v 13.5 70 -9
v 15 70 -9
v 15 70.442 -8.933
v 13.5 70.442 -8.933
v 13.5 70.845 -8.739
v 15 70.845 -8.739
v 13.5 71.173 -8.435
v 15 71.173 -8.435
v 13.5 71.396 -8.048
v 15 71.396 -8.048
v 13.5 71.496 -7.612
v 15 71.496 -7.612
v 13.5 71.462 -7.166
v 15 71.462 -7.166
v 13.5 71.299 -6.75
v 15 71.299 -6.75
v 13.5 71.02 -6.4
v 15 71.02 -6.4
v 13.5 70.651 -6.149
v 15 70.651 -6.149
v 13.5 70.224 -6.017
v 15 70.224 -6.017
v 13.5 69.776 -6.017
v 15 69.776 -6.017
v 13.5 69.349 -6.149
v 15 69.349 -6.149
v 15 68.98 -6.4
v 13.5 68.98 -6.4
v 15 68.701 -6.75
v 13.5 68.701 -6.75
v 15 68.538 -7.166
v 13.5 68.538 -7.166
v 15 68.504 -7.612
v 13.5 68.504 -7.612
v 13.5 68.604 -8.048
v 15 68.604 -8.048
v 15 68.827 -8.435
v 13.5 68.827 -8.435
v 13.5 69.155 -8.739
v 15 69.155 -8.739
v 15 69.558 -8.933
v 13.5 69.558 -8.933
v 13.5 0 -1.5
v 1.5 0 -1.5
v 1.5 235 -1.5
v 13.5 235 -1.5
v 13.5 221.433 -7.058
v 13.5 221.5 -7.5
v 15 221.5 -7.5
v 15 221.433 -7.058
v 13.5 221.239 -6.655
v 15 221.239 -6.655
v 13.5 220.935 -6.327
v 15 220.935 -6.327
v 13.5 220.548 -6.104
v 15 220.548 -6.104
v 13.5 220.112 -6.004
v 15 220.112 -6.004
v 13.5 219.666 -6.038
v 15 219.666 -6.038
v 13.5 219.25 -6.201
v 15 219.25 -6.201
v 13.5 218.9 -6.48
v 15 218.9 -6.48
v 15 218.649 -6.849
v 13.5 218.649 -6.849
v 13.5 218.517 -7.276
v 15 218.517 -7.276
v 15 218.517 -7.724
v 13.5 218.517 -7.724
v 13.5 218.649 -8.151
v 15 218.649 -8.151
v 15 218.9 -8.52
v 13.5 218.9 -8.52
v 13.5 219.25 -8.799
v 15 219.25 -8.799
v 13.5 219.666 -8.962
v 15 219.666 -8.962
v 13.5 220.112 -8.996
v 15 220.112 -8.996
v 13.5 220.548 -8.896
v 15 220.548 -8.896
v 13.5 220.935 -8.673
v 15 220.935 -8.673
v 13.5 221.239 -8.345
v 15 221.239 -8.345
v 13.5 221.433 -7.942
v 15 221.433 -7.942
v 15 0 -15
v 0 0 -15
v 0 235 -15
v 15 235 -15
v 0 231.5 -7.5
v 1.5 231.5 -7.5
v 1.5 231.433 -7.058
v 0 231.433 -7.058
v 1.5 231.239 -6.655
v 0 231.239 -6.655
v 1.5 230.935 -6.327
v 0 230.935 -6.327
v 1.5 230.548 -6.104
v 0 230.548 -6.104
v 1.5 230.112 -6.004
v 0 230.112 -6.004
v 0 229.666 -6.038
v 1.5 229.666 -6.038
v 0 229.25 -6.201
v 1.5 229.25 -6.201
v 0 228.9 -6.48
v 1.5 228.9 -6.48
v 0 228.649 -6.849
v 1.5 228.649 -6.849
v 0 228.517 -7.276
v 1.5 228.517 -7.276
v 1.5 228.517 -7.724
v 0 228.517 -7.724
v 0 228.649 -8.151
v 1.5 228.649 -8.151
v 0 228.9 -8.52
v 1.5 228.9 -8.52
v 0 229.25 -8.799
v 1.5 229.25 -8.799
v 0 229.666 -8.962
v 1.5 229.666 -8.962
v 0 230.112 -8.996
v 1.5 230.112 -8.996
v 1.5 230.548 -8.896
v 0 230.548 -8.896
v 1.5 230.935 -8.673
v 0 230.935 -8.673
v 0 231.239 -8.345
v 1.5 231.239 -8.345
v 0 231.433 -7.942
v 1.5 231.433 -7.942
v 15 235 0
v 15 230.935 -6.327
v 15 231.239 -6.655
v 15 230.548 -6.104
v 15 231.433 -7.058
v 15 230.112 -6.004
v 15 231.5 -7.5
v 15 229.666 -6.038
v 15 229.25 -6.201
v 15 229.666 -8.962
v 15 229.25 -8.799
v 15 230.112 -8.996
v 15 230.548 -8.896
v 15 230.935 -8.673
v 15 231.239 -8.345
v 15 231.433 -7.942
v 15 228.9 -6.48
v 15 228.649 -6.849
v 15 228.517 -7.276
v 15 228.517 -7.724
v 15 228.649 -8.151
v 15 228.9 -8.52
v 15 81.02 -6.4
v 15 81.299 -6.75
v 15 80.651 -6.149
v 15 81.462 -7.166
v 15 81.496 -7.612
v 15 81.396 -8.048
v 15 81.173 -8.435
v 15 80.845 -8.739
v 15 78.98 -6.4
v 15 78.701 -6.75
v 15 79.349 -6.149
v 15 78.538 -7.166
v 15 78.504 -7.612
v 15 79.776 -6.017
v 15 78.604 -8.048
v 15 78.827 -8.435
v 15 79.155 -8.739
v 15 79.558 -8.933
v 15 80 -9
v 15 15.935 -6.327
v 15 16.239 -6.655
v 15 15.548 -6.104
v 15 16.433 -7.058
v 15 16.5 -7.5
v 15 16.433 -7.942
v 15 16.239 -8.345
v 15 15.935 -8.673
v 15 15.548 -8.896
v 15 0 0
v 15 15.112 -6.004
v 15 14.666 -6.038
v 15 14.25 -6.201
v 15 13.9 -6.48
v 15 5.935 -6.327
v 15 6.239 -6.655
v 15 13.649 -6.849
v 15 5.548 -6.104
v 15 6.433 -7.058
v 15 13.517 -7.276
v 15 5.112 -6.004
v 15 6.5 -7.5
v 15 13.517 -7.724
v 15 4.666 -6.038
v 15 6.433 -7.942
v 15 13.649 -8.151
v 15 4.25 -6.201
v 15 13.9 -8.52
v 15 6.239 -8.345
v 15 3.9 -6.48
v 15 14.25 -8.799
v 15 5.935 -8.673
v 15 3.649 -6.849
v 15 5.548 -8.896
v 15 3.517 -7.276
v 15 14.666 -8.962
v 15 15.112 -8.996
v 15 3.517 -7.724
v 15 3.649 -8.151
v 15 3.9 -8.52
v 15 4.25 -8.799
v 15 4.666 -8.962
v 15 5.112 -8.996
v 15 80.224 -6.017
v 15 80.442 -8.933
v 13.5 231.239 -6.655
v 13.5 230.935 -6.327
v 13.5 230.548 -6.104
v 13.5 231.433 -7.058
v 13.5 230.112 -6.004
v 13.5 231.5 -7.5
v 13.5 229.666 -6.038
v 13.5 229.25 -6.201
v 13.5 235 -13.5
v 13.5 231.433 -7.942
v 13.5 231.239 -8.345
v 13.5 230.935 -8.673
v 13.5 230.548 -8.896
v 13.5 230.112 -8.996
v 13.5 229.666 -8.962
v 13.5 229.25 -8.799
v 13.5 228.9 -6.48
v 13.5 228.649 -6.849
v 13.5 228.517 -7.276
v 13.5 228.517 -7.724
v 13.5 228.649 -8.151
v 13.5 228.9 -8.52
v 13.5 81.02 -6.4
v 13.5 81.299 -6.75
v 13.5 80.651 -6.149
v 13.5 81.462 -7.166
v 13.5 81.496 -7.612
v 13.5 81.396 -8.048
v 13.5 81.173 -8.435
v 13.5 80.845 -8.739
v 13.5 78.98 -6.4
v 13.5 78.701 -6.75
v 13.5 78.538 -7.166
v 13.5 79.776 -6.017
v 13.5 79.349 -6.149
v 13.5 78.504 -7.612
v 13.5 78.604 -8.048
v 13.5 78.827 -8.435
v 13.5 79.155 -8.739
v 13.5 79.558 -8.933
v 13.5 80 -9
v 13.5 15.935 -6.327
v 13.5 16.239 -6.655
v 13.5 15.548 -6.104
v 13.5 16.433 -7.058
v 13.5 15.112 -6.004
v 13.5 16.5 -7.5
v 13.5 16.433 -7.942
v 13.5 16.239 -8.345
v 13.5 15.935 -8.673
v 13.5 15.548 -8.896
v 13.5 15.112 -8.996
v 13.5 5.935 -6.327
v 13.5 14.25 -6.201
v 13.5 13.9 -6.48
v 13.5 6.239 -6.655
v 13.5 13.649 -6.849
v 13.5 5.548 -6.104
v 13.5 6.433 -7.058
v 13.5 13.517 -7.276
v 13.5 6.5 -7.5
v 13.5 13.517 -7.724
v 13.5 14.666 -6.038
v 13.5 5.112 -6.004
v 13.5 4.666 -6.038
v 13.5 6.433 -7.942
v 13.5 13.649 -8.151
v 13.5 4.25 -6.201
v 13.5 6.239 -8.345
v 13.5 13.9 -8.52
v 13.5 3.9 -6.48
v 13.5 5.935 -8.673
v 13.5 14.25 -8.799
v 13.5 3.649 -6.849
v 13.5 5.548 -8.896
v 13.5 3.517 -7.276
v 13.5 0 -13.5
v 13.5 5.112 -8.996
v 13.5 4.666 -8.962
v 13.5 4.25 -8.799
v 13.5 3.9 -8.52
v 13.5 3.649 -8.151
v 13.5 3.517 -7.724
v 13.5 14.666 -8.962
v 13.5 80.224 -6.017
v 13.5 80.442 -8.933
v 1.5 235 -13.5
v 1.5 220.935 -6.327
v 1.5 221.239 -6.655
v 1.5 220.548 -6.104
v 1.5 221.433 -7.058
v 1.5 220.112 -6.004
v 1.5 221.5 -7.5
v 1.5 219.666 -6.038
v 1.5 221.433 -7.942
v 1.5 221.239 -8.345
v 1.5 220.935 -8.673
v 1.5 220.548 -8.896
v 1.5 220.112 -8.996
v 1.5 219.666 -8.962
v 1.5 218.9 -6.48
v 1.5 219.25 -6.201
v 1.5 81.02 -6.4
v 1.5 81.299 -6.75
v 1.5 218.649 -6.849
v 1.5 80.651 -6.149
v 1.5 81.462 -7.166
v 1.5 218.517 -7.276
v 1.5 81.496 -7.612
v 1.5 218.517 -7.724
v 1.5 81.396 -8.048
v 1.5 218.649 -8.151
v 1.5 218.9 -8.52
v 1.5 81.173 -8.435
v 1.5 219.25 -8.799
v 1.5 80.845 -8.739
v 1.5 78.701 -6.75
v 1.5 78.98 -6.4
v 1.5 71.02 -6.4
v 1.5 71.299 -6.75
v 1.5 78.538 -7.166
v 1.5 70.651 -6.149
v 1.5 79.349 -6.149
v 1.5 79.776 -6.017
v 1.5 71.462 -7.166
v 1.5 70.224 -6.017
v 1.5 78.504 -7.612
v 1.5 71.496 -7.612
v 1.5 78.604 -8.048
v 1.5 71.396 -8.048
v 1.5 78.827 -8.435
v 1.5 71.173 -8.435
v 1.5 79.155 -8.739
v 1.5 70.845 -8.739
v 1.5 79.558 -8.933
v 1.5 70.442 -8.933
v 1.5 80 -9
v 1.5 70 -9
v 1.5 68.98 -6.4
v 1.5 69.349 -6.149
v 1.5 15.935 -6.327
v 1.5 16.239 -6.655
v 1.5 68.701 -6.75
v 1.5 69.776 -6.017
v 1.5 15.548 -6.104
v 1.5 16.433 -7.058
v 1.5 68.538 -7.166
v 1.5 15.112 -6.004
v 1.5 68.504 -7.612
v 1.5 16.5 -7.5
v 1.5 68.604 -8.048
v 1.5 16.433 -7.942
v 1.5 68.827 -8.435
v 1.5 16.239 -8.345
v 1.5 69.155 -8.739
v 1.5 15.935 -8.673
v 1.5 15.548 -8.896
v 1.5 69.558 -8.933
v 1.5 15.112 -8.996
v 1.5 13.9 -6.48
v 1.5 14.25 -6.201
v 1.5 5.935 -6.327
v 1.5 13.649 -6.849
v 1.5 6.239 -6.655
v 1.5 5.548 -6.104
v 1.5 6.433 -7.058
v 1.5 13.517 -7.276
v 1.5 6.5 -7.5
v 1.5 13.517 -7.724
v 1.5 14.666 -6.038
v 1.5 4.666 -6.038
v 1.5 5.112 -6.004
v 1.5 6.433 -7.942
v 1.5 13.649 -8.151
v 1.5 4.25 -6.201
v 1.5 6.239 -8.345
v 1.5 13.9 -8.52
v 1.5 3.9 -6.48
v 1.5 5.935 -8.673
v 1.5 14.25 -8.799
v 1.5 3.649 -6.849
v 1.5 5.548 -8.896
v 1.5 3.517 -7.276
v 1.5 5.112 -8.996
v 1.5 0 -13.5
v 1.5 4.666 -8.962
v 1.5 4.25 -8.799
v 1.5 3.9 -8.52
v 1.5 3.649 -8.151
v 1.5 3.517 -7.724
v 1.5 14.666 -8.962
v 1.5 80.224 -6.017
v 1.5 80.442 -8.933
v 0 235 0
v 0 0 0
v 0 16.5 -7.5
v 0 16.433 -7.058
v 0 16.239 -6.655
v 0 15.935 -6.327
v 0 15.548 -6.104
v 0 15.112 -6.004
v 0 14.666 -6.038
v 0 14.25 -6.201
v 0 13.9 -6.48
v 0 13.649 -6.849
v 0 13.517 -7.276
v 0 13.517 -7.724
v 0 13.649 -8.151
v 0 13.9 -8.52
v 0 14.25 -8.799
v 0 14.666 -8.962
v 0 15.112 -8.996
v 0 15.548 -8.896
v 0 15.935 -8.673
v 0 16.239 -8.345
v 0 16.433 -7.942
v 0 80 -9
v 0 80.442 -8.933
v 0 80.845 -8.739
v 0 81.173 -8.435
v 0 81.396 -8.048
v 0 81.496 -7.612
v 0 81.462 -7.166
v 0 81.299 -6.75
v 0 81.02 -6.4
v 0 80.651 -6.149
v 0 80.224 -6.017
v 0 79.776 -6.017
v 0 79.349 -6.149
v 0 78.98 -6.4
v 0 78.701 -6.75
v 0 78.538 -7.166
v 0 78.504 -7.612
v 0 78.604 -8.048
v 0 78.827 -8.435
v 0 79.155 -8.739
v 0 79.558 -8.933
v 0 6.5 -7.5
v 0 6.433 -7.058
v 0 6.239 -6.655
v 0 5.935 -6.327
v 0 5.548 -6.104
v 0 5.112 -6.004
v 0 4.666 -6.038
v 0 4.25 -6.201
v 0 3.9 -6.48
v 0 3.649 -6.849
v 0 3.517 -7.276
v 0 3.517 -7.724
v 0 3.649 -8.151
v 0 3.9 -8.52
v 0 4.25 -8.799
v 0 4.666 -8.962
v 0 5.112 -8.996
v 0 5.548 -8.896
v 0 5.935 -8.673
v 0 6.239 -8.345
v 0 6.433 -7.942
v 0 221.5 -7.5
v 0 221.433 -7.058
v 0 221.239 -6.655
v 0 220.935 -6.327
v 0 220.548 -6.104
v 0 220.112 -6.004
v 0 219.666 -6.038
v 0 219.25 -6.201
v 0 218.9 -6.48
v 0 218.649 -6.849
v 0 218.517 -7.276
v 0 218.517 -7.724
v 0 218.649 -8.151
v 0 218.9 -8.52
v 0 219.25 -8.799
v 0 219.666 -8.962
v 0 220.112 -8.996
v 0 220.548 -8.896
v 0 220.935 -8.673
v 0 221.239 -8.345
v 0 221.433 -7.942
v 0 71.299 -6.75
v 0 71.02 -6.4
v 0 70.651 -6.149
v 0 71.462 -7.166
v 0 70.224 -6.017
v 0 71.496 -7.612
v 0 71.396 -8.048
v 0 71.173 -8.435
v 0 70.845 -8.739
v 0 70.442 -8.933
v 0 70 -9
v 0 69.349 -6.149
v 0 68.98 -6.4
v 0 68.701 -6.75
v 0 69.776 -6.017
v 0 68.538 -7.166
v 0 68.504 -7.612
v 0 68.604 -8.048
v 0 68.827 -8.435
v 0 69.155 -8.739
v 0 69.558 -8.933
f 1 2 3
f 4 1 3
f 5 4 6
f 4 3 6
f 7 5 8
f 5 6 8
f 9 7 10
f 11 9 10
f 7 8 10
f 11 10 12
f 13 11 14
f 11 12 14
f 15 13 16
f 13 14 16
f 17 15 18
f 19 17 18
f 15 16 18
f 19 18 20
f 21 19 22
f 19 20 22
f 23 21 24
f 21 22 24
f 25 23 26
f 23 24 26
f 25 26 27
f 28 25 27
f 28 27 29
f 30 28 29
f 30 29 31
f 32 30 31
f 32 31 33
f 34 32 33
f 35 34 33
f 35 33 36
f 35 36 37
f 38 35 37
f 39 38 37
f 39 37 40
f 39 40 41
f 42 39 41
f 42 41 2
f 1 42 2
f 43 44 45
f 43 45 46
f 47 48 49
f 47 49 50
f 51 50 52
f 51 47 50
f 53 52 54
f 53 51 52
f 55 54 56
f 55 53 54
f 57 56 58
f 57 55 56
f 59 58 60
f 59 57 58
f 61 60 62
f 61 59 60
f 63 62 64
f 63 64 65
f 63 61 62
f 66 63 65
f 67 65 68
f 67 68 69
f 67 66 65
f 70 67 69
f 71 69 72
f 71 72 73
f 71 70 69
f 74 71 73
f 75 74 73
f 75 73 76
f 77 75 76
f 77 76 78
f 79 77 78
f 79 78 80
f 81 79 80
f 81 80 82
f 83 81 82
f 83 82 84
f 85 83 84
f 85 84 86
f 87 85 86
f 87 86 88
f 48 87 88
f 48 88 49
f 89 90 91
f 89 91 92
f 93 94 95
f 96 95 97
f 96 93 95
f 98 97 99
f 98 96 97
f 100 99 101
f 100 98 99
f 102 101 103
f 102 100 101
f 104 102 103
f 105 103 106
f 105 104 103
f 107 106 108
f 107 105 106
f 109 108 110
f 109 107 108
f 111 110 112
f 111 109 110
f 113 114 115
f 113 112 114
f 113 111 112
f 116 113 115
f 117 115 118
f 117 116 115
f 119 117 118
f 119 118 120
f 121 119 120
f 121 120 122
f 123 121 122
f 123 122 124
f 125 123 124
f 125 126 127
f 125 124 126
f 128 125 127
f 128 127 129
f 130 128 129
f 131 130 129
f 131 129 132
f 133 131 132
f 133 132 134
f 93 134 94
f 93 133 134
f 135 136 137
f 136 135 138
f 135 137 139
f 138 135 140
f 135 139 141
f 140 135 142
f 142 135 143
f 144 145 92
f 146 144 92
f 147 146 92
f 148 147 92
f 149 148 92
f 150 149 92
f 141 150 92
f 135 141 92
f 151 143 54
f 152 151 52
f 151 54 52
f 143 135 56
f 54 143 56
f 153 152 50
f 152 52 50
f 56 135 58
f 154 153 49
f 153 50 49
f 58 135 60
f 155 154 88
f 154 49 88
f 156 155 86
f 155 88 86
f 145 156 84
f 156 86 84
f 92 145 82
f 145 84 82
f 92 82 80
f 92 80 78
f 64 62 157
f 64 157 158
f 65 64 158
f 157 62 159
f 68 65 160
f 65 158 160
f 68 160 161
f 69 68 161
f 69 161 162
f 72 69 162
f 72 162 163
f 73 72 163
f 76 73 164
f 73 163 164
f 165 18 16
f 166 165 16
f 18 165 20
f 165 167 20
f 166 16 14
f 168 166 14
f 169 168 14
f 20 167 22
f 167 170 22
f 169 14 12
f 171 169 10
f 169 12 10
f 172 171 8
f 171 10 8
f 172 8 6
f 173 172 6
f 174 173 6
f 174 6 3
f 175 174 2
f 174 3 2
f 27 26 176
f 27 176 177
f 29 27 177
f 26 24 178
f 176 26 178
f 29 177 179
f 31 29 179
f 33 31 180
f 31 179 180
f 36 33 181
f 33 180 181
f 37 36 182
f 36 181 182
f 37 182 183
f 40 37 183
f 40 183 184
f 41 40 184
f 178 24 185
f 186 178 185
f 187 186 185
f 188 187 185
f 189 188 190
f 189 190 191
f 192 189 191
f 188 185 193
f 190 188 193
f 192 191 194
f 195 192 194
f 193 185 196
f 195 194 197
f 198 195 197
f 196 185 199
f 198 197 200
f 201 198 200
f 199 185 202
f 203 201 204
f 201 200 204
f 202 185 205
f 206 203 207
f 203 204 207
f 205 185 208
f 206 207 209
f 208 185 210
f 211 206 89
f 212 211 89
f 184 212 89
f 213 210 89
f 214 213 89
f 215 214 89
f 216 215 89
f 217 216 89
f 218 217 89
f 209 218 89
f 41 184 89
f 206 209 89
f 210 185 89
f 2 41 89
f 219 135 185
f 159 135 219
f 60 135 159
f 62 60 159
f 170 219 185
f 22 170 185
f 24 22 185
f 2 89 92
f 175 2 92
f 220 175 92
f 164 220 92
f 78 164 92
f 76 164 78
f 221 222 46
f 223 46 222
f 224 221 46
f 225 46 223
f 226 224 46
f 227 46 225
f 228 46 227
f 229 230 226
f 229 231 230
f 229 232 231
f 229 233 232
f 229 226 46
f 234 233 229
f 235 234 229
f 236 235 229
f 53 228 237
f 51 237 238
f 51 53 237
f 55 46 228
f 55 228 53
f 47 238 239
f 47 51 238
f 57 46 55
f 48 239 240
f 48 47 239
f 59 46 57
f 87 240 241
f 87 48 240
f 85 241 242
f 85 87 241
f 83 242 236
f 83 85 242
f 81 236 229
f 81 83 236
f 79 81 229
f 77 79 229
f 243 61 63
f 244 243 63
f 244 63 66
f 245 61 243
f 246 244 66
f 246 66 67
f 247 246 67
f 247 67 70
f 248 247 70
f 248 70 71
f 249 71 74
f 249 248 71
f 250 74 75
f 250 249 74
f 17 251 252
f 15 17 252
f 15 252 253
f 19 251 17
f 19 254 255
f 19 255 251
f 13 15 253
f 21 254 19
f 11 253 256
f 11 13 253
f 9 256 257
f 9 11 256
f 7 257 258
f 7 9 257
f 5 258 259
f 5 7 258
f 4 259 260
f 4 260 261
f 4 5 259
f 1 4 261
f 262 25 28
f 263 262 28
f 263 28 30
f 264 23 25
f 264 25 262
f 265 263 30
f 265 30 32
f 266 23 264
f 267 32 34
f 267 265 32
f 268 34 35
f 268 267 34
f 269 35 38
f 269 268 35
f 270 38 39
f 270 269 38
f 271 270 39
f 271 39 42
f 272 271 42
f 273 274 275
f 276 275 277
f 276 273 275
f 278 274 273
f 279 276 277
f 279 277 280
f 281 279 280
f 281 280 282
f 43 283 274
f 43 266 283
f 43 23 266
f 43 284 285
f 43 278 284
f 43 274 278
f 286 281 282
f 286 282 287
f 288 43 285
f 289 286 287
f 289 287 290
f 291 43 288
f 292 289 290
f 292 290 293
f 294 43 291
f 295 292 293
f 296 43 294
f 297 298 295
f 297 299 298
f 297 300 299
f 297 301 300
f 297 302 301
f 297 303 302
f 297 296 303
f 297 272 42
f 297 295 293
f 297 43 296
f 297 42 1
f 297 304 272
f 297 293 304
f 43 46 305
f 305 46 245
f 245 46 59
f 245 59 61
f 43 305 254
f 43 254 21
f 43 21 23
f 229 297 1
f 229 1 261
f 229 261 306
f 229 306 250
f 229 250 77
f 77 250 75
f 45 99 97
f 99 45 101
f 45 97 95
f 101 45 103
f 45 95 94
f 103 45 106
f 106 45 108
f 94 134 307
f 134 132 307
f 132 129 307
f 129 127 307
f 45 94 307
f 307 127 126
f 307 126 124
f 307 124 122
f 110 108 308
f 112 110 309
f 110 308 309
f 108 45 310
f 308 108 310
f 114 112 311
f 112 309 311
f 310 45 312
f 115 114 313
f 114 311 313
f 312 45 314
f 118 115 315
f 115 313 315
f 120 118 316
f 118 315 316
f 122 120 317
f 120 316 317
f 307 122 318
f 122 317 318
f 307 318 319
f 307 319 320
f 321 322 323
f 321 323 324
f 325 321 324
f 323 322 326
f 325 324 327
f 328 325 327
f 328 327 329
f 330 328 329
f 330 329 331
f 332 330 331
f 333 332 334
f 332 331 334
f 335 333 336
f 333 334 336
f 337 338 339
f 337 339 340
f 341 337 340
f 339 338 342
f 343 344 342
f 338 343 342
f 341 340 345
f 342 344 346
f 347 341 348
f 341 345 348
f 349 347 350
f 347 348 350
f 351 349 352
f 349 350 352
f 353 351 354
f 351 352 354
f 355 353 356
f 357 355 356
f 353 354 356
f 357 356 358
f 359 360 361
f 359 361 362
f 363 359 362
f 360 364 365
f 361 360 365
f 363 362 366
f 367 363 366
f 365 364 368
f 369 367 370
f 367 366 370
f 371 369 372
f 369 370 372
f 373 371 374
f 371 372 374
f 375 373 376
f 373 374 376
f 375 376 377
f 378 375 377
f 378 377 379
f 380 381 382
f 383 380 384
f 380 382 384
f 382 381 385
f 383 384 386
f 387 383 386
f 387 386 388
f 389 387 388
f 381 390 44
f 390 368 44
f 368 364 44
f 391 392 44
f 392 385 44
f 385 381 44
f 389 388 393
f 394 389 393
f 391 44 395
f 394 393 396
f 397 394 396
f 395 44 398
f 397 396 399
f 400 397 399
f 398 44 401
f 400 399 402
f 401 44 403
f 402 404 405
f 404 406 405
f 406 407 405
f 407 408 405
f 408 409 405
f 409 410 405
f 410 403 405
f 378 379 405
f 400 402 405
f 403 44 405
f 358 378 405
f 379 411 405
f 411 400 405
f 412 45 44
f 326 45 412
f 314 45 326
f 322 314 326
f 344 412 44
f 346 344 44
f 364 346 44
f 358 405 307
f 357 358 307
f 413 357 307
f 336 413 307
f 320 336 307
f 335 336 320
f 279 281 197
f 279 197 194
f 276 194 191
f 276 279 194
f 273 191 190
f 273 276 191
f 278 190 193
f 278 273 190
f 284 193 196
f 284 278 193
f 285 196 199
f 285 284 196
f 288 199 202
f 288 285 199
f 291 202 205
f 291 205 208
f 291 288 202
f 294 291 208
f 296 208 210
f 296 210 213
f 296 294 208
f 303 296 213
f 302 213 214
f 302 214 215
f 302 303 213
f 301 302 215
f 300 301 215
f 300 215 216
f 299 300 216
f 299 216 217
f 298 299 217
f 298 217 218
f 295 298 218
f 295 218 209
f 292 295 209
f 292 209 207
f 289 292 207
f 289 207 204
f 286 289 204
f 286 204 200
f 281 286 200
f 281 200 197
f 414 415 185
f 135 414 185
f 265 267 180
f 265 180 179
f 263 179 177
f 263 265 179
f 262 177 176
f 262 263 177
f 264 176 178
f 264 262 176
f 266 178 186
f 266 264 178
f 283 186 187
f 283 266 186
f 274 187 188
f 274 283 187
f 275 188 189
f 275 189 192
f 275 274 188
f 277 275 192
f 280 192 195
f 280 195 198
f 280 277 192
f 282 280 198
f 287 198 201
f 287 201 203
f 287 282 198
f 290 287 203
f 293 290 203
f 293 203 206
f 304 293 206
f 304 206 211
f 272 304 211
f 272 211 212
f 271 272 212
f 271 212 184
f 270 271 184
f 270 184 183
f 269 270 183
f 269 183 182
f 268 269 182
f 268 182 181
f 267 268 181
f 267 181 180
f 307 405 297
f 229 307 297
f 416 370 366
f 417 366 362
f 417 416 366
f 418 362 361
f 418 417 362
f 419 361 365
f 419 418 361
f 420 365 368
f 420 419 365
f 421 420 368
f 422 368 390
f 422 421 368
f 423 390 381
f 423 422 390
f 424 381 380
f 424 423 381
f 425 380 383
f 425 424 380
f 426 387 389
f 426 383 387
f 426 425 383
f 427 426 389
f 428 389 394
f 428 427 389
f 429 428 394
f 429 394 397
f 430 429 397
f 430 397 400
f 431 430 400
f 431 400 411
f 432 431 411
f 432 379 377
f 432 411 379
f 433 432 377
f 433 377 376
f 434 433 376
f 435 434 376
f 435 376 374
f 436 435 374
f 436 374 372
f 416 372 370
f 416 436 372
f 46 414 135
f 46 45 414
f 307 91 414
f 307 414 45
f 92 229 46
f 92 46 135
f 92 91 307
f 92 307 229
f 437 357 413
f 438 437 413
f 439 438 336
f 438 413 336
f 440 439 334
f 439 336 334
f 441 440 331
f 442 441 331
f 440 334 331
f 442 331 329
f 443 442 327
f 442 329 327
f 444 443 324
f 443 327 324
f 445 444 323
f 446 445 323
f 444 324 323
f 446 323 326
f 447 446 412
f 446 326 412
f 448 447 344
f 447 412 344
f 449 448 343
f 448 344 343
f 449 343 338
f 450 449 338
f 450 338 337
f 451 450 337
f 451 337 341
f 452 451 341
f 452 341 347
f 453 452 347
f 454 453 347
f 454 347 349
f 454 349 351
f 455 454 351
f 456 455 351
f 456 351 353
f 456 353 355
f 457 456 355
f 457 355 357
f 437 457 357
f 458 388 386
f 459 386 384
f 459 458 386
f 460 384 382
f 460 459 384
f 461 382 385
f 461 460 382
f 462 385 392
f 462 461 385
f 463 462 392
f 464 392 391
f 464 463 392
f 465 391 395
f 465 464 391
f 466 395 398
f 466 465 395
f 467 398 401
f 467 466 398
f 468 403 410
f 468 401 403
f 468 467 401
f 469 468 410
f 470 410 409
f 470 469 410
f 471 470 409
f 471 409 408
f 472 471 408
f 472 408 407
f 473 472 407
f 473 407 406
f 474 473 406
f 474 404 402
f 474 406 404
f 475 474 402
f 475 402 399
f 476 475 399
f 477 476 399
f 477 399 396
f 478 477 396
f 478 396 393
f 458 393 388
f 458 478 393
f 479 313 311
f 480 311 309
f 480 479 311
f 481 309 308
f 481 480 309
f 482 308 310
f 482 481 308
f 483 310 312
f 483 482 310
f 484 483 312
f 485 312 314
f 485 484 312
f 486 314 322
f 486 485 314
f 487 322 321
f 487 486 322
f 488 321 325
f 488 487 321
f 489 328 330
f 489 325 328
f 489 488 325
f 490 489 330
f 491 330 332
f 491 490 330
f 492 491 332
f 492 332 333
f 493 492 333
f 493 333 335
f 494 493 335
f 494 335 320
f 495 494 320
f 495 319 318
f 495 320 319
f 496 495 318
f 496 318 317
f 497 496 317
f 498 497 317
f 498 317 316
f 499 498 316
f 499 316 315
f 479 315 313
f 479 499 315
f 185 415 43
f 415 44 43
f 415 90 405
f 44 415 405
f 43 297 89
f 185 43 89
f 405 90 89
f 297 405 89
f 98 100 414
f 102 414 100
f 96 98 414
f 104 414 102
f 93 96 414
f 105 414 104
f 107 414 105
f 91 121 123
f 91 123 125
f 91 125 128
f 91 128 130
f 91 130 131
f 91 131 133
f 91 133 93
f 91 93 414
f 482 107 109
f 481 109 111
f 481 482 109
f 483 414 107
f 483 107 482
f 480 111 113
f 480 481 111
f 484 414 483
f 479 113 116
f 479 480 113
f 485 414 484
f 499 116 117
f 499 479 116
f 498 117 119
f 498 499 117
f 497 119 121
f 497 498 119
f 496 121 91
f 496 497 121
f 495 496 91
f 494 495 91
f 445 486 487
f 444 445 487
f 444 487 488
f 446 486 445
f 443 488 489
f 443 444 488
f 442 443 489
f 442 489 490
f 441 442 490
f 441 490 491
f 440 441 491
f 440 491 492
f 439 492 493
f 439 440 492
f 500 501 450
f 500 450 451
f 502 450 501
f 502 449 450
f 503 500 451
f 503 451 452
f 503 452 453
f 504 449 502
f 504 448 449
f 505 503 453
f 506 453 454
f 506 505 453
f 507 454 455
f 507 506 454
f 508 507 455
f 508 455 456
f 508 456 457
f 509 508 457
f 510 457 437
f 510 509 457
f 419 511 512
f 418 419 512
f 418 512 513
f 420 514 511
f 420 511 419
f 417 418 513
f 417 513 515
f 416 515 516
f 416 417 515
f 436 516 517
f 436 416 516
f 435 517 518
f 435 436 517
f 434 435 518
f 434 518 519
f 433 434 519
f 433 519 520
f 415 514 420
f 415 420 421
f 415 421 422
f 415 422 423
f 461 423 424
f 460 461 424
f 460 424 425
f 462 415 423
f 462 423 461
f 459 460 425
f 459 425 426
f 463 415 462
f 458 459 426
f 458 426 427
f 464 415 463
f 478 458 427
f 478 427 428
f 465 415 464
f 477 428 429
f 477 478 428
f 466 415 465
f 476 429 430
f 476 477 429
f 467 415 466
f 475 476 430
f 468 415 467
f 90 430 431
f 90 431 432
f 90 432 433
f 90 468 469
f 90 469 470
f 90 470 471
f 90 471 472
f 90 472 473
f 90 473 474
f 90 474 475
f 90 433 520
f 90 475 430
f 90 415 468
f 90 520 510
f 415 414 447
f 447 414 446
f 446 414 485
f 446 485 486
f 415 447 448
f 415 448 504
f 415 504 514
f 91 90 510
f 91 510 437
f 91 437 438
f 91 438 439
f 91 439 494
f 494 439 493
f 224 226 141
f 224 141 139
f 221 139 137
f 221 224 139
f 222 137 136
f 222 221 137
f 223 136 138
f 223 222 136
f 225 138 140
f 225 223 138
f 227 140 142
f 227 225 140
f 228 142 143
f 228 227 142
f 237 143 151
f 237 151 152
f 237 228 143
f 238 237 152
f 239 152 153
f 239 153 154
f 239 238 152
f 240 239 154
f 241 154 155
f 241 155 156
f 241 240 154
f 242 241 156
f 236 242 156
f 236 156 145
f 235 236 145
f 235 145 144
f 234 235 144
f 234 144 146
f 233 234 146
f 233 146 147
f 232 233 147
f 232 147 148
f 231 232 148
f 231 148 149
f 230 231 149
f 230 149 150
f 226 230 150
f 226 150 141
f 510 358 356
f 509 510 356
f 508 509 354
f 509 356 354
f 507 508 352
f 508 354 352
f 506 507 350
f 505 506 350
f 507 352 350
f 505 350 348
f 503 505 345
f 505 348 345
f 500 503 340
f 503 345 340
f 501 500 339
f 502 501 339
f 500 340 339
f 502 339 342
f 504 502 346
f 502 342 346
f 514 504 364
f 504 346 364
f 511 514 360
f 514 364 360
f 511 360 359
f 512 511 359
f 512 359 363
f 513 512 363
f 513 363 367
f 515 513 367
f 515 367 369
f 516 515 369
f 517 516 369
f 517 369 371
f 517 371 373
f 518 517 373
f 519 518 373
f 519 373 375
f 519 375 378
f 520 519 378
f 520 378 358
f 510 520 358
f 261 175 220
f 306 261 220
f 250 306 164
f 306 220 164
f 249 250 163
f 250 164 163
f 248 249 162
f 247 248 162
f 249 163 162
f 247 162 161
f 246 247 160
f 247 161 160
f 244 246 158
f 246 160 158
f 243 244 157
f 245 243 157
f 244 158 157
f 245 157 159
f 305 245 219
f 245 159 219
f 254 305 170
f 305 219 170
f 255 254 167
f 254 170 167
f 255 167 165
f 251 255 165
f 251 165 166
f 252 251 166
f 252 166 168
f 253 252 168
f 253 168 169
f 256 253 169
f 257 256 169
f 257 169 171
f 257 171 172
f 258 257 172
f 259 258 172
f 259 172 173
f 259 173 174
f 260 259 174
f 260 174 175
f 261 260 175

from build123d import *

# Parameters (mm, degrees)
SKETCH1_W              = 15
SKETCH1_H              = 15
SKETCH1_W_2            = 12
SKETCH1_H_2            = 12
EXTRUDE_THIN1_DEPTH    = 235
CUT_EXTRUDE1_OUTLINE_R = 1.5
CUT_EXTRUDE1_DEPTH     = 15
SKETCH3_R              = 1.5
CUT_EXTRUDE2_DEPTH     = 236.95550428


# Read off the part's stored shape, not the designer's step: Cut-Extrude1
with BuildPart() as part:
    # Sketch1 → Extrude-Thin1 (new body)
    with BuildSketch(Plane(origin=(0, 0, 0), x_dir=(1, 0, 0), z_dir=(0, 1, 0))):
        with Locations((7.5, 7.5)):
            Rectangle(SKETCH1_W, SKETCH1_H)
        with Locations((7.5, 7.5)):
            Rectangle(SKETCH1_W_2, SKETCH1_H_2, mode=Mode.SUBTRACT)
    extrude(amount=EXTRUDE_THIN1_DEPTH)

    # Cut-Extrude1 outline → Cut-Extrude1 (cut)
    with BuildSketch(Plane.YZ):
        with Locations((15, -7.5)):
            Circle(CUT_EXTRUDE1_OUTLINE_R)
        with Locations((5, -7.5)):
            Circle(CUT_EXTRUDE1_OUTLINE_R)
        with Locations((220, -7.5)):
            Circle(CUT_EXTRUDE1_OUTLINE_R)
        with Locations((230, -7.5)):
            Circle(CUT_EXTRUDE1_OUTLINE_R)
    extrude(amount=CUT_EXTRUDE1_DEPTH, mode=Mode.SUBTRACT)

    # Sketch3 → Cut-Extrude2 (cut, through all)
    with BuildSketch(Plane(origin=(15, 0, 0), x_dir=(0, 0, -1), z_dir=(1, 0, 0))):
        with Locations((7.5, 80)):
            Circle(SKETCH3_R)
        with Locations((7.5, 70)):
            Circle(SKETCH3_R)
    extrude(amount=-CUT_EXTRUDE2_DEPTH, mode=Mode.SUBTRACT)


solid = part.part
